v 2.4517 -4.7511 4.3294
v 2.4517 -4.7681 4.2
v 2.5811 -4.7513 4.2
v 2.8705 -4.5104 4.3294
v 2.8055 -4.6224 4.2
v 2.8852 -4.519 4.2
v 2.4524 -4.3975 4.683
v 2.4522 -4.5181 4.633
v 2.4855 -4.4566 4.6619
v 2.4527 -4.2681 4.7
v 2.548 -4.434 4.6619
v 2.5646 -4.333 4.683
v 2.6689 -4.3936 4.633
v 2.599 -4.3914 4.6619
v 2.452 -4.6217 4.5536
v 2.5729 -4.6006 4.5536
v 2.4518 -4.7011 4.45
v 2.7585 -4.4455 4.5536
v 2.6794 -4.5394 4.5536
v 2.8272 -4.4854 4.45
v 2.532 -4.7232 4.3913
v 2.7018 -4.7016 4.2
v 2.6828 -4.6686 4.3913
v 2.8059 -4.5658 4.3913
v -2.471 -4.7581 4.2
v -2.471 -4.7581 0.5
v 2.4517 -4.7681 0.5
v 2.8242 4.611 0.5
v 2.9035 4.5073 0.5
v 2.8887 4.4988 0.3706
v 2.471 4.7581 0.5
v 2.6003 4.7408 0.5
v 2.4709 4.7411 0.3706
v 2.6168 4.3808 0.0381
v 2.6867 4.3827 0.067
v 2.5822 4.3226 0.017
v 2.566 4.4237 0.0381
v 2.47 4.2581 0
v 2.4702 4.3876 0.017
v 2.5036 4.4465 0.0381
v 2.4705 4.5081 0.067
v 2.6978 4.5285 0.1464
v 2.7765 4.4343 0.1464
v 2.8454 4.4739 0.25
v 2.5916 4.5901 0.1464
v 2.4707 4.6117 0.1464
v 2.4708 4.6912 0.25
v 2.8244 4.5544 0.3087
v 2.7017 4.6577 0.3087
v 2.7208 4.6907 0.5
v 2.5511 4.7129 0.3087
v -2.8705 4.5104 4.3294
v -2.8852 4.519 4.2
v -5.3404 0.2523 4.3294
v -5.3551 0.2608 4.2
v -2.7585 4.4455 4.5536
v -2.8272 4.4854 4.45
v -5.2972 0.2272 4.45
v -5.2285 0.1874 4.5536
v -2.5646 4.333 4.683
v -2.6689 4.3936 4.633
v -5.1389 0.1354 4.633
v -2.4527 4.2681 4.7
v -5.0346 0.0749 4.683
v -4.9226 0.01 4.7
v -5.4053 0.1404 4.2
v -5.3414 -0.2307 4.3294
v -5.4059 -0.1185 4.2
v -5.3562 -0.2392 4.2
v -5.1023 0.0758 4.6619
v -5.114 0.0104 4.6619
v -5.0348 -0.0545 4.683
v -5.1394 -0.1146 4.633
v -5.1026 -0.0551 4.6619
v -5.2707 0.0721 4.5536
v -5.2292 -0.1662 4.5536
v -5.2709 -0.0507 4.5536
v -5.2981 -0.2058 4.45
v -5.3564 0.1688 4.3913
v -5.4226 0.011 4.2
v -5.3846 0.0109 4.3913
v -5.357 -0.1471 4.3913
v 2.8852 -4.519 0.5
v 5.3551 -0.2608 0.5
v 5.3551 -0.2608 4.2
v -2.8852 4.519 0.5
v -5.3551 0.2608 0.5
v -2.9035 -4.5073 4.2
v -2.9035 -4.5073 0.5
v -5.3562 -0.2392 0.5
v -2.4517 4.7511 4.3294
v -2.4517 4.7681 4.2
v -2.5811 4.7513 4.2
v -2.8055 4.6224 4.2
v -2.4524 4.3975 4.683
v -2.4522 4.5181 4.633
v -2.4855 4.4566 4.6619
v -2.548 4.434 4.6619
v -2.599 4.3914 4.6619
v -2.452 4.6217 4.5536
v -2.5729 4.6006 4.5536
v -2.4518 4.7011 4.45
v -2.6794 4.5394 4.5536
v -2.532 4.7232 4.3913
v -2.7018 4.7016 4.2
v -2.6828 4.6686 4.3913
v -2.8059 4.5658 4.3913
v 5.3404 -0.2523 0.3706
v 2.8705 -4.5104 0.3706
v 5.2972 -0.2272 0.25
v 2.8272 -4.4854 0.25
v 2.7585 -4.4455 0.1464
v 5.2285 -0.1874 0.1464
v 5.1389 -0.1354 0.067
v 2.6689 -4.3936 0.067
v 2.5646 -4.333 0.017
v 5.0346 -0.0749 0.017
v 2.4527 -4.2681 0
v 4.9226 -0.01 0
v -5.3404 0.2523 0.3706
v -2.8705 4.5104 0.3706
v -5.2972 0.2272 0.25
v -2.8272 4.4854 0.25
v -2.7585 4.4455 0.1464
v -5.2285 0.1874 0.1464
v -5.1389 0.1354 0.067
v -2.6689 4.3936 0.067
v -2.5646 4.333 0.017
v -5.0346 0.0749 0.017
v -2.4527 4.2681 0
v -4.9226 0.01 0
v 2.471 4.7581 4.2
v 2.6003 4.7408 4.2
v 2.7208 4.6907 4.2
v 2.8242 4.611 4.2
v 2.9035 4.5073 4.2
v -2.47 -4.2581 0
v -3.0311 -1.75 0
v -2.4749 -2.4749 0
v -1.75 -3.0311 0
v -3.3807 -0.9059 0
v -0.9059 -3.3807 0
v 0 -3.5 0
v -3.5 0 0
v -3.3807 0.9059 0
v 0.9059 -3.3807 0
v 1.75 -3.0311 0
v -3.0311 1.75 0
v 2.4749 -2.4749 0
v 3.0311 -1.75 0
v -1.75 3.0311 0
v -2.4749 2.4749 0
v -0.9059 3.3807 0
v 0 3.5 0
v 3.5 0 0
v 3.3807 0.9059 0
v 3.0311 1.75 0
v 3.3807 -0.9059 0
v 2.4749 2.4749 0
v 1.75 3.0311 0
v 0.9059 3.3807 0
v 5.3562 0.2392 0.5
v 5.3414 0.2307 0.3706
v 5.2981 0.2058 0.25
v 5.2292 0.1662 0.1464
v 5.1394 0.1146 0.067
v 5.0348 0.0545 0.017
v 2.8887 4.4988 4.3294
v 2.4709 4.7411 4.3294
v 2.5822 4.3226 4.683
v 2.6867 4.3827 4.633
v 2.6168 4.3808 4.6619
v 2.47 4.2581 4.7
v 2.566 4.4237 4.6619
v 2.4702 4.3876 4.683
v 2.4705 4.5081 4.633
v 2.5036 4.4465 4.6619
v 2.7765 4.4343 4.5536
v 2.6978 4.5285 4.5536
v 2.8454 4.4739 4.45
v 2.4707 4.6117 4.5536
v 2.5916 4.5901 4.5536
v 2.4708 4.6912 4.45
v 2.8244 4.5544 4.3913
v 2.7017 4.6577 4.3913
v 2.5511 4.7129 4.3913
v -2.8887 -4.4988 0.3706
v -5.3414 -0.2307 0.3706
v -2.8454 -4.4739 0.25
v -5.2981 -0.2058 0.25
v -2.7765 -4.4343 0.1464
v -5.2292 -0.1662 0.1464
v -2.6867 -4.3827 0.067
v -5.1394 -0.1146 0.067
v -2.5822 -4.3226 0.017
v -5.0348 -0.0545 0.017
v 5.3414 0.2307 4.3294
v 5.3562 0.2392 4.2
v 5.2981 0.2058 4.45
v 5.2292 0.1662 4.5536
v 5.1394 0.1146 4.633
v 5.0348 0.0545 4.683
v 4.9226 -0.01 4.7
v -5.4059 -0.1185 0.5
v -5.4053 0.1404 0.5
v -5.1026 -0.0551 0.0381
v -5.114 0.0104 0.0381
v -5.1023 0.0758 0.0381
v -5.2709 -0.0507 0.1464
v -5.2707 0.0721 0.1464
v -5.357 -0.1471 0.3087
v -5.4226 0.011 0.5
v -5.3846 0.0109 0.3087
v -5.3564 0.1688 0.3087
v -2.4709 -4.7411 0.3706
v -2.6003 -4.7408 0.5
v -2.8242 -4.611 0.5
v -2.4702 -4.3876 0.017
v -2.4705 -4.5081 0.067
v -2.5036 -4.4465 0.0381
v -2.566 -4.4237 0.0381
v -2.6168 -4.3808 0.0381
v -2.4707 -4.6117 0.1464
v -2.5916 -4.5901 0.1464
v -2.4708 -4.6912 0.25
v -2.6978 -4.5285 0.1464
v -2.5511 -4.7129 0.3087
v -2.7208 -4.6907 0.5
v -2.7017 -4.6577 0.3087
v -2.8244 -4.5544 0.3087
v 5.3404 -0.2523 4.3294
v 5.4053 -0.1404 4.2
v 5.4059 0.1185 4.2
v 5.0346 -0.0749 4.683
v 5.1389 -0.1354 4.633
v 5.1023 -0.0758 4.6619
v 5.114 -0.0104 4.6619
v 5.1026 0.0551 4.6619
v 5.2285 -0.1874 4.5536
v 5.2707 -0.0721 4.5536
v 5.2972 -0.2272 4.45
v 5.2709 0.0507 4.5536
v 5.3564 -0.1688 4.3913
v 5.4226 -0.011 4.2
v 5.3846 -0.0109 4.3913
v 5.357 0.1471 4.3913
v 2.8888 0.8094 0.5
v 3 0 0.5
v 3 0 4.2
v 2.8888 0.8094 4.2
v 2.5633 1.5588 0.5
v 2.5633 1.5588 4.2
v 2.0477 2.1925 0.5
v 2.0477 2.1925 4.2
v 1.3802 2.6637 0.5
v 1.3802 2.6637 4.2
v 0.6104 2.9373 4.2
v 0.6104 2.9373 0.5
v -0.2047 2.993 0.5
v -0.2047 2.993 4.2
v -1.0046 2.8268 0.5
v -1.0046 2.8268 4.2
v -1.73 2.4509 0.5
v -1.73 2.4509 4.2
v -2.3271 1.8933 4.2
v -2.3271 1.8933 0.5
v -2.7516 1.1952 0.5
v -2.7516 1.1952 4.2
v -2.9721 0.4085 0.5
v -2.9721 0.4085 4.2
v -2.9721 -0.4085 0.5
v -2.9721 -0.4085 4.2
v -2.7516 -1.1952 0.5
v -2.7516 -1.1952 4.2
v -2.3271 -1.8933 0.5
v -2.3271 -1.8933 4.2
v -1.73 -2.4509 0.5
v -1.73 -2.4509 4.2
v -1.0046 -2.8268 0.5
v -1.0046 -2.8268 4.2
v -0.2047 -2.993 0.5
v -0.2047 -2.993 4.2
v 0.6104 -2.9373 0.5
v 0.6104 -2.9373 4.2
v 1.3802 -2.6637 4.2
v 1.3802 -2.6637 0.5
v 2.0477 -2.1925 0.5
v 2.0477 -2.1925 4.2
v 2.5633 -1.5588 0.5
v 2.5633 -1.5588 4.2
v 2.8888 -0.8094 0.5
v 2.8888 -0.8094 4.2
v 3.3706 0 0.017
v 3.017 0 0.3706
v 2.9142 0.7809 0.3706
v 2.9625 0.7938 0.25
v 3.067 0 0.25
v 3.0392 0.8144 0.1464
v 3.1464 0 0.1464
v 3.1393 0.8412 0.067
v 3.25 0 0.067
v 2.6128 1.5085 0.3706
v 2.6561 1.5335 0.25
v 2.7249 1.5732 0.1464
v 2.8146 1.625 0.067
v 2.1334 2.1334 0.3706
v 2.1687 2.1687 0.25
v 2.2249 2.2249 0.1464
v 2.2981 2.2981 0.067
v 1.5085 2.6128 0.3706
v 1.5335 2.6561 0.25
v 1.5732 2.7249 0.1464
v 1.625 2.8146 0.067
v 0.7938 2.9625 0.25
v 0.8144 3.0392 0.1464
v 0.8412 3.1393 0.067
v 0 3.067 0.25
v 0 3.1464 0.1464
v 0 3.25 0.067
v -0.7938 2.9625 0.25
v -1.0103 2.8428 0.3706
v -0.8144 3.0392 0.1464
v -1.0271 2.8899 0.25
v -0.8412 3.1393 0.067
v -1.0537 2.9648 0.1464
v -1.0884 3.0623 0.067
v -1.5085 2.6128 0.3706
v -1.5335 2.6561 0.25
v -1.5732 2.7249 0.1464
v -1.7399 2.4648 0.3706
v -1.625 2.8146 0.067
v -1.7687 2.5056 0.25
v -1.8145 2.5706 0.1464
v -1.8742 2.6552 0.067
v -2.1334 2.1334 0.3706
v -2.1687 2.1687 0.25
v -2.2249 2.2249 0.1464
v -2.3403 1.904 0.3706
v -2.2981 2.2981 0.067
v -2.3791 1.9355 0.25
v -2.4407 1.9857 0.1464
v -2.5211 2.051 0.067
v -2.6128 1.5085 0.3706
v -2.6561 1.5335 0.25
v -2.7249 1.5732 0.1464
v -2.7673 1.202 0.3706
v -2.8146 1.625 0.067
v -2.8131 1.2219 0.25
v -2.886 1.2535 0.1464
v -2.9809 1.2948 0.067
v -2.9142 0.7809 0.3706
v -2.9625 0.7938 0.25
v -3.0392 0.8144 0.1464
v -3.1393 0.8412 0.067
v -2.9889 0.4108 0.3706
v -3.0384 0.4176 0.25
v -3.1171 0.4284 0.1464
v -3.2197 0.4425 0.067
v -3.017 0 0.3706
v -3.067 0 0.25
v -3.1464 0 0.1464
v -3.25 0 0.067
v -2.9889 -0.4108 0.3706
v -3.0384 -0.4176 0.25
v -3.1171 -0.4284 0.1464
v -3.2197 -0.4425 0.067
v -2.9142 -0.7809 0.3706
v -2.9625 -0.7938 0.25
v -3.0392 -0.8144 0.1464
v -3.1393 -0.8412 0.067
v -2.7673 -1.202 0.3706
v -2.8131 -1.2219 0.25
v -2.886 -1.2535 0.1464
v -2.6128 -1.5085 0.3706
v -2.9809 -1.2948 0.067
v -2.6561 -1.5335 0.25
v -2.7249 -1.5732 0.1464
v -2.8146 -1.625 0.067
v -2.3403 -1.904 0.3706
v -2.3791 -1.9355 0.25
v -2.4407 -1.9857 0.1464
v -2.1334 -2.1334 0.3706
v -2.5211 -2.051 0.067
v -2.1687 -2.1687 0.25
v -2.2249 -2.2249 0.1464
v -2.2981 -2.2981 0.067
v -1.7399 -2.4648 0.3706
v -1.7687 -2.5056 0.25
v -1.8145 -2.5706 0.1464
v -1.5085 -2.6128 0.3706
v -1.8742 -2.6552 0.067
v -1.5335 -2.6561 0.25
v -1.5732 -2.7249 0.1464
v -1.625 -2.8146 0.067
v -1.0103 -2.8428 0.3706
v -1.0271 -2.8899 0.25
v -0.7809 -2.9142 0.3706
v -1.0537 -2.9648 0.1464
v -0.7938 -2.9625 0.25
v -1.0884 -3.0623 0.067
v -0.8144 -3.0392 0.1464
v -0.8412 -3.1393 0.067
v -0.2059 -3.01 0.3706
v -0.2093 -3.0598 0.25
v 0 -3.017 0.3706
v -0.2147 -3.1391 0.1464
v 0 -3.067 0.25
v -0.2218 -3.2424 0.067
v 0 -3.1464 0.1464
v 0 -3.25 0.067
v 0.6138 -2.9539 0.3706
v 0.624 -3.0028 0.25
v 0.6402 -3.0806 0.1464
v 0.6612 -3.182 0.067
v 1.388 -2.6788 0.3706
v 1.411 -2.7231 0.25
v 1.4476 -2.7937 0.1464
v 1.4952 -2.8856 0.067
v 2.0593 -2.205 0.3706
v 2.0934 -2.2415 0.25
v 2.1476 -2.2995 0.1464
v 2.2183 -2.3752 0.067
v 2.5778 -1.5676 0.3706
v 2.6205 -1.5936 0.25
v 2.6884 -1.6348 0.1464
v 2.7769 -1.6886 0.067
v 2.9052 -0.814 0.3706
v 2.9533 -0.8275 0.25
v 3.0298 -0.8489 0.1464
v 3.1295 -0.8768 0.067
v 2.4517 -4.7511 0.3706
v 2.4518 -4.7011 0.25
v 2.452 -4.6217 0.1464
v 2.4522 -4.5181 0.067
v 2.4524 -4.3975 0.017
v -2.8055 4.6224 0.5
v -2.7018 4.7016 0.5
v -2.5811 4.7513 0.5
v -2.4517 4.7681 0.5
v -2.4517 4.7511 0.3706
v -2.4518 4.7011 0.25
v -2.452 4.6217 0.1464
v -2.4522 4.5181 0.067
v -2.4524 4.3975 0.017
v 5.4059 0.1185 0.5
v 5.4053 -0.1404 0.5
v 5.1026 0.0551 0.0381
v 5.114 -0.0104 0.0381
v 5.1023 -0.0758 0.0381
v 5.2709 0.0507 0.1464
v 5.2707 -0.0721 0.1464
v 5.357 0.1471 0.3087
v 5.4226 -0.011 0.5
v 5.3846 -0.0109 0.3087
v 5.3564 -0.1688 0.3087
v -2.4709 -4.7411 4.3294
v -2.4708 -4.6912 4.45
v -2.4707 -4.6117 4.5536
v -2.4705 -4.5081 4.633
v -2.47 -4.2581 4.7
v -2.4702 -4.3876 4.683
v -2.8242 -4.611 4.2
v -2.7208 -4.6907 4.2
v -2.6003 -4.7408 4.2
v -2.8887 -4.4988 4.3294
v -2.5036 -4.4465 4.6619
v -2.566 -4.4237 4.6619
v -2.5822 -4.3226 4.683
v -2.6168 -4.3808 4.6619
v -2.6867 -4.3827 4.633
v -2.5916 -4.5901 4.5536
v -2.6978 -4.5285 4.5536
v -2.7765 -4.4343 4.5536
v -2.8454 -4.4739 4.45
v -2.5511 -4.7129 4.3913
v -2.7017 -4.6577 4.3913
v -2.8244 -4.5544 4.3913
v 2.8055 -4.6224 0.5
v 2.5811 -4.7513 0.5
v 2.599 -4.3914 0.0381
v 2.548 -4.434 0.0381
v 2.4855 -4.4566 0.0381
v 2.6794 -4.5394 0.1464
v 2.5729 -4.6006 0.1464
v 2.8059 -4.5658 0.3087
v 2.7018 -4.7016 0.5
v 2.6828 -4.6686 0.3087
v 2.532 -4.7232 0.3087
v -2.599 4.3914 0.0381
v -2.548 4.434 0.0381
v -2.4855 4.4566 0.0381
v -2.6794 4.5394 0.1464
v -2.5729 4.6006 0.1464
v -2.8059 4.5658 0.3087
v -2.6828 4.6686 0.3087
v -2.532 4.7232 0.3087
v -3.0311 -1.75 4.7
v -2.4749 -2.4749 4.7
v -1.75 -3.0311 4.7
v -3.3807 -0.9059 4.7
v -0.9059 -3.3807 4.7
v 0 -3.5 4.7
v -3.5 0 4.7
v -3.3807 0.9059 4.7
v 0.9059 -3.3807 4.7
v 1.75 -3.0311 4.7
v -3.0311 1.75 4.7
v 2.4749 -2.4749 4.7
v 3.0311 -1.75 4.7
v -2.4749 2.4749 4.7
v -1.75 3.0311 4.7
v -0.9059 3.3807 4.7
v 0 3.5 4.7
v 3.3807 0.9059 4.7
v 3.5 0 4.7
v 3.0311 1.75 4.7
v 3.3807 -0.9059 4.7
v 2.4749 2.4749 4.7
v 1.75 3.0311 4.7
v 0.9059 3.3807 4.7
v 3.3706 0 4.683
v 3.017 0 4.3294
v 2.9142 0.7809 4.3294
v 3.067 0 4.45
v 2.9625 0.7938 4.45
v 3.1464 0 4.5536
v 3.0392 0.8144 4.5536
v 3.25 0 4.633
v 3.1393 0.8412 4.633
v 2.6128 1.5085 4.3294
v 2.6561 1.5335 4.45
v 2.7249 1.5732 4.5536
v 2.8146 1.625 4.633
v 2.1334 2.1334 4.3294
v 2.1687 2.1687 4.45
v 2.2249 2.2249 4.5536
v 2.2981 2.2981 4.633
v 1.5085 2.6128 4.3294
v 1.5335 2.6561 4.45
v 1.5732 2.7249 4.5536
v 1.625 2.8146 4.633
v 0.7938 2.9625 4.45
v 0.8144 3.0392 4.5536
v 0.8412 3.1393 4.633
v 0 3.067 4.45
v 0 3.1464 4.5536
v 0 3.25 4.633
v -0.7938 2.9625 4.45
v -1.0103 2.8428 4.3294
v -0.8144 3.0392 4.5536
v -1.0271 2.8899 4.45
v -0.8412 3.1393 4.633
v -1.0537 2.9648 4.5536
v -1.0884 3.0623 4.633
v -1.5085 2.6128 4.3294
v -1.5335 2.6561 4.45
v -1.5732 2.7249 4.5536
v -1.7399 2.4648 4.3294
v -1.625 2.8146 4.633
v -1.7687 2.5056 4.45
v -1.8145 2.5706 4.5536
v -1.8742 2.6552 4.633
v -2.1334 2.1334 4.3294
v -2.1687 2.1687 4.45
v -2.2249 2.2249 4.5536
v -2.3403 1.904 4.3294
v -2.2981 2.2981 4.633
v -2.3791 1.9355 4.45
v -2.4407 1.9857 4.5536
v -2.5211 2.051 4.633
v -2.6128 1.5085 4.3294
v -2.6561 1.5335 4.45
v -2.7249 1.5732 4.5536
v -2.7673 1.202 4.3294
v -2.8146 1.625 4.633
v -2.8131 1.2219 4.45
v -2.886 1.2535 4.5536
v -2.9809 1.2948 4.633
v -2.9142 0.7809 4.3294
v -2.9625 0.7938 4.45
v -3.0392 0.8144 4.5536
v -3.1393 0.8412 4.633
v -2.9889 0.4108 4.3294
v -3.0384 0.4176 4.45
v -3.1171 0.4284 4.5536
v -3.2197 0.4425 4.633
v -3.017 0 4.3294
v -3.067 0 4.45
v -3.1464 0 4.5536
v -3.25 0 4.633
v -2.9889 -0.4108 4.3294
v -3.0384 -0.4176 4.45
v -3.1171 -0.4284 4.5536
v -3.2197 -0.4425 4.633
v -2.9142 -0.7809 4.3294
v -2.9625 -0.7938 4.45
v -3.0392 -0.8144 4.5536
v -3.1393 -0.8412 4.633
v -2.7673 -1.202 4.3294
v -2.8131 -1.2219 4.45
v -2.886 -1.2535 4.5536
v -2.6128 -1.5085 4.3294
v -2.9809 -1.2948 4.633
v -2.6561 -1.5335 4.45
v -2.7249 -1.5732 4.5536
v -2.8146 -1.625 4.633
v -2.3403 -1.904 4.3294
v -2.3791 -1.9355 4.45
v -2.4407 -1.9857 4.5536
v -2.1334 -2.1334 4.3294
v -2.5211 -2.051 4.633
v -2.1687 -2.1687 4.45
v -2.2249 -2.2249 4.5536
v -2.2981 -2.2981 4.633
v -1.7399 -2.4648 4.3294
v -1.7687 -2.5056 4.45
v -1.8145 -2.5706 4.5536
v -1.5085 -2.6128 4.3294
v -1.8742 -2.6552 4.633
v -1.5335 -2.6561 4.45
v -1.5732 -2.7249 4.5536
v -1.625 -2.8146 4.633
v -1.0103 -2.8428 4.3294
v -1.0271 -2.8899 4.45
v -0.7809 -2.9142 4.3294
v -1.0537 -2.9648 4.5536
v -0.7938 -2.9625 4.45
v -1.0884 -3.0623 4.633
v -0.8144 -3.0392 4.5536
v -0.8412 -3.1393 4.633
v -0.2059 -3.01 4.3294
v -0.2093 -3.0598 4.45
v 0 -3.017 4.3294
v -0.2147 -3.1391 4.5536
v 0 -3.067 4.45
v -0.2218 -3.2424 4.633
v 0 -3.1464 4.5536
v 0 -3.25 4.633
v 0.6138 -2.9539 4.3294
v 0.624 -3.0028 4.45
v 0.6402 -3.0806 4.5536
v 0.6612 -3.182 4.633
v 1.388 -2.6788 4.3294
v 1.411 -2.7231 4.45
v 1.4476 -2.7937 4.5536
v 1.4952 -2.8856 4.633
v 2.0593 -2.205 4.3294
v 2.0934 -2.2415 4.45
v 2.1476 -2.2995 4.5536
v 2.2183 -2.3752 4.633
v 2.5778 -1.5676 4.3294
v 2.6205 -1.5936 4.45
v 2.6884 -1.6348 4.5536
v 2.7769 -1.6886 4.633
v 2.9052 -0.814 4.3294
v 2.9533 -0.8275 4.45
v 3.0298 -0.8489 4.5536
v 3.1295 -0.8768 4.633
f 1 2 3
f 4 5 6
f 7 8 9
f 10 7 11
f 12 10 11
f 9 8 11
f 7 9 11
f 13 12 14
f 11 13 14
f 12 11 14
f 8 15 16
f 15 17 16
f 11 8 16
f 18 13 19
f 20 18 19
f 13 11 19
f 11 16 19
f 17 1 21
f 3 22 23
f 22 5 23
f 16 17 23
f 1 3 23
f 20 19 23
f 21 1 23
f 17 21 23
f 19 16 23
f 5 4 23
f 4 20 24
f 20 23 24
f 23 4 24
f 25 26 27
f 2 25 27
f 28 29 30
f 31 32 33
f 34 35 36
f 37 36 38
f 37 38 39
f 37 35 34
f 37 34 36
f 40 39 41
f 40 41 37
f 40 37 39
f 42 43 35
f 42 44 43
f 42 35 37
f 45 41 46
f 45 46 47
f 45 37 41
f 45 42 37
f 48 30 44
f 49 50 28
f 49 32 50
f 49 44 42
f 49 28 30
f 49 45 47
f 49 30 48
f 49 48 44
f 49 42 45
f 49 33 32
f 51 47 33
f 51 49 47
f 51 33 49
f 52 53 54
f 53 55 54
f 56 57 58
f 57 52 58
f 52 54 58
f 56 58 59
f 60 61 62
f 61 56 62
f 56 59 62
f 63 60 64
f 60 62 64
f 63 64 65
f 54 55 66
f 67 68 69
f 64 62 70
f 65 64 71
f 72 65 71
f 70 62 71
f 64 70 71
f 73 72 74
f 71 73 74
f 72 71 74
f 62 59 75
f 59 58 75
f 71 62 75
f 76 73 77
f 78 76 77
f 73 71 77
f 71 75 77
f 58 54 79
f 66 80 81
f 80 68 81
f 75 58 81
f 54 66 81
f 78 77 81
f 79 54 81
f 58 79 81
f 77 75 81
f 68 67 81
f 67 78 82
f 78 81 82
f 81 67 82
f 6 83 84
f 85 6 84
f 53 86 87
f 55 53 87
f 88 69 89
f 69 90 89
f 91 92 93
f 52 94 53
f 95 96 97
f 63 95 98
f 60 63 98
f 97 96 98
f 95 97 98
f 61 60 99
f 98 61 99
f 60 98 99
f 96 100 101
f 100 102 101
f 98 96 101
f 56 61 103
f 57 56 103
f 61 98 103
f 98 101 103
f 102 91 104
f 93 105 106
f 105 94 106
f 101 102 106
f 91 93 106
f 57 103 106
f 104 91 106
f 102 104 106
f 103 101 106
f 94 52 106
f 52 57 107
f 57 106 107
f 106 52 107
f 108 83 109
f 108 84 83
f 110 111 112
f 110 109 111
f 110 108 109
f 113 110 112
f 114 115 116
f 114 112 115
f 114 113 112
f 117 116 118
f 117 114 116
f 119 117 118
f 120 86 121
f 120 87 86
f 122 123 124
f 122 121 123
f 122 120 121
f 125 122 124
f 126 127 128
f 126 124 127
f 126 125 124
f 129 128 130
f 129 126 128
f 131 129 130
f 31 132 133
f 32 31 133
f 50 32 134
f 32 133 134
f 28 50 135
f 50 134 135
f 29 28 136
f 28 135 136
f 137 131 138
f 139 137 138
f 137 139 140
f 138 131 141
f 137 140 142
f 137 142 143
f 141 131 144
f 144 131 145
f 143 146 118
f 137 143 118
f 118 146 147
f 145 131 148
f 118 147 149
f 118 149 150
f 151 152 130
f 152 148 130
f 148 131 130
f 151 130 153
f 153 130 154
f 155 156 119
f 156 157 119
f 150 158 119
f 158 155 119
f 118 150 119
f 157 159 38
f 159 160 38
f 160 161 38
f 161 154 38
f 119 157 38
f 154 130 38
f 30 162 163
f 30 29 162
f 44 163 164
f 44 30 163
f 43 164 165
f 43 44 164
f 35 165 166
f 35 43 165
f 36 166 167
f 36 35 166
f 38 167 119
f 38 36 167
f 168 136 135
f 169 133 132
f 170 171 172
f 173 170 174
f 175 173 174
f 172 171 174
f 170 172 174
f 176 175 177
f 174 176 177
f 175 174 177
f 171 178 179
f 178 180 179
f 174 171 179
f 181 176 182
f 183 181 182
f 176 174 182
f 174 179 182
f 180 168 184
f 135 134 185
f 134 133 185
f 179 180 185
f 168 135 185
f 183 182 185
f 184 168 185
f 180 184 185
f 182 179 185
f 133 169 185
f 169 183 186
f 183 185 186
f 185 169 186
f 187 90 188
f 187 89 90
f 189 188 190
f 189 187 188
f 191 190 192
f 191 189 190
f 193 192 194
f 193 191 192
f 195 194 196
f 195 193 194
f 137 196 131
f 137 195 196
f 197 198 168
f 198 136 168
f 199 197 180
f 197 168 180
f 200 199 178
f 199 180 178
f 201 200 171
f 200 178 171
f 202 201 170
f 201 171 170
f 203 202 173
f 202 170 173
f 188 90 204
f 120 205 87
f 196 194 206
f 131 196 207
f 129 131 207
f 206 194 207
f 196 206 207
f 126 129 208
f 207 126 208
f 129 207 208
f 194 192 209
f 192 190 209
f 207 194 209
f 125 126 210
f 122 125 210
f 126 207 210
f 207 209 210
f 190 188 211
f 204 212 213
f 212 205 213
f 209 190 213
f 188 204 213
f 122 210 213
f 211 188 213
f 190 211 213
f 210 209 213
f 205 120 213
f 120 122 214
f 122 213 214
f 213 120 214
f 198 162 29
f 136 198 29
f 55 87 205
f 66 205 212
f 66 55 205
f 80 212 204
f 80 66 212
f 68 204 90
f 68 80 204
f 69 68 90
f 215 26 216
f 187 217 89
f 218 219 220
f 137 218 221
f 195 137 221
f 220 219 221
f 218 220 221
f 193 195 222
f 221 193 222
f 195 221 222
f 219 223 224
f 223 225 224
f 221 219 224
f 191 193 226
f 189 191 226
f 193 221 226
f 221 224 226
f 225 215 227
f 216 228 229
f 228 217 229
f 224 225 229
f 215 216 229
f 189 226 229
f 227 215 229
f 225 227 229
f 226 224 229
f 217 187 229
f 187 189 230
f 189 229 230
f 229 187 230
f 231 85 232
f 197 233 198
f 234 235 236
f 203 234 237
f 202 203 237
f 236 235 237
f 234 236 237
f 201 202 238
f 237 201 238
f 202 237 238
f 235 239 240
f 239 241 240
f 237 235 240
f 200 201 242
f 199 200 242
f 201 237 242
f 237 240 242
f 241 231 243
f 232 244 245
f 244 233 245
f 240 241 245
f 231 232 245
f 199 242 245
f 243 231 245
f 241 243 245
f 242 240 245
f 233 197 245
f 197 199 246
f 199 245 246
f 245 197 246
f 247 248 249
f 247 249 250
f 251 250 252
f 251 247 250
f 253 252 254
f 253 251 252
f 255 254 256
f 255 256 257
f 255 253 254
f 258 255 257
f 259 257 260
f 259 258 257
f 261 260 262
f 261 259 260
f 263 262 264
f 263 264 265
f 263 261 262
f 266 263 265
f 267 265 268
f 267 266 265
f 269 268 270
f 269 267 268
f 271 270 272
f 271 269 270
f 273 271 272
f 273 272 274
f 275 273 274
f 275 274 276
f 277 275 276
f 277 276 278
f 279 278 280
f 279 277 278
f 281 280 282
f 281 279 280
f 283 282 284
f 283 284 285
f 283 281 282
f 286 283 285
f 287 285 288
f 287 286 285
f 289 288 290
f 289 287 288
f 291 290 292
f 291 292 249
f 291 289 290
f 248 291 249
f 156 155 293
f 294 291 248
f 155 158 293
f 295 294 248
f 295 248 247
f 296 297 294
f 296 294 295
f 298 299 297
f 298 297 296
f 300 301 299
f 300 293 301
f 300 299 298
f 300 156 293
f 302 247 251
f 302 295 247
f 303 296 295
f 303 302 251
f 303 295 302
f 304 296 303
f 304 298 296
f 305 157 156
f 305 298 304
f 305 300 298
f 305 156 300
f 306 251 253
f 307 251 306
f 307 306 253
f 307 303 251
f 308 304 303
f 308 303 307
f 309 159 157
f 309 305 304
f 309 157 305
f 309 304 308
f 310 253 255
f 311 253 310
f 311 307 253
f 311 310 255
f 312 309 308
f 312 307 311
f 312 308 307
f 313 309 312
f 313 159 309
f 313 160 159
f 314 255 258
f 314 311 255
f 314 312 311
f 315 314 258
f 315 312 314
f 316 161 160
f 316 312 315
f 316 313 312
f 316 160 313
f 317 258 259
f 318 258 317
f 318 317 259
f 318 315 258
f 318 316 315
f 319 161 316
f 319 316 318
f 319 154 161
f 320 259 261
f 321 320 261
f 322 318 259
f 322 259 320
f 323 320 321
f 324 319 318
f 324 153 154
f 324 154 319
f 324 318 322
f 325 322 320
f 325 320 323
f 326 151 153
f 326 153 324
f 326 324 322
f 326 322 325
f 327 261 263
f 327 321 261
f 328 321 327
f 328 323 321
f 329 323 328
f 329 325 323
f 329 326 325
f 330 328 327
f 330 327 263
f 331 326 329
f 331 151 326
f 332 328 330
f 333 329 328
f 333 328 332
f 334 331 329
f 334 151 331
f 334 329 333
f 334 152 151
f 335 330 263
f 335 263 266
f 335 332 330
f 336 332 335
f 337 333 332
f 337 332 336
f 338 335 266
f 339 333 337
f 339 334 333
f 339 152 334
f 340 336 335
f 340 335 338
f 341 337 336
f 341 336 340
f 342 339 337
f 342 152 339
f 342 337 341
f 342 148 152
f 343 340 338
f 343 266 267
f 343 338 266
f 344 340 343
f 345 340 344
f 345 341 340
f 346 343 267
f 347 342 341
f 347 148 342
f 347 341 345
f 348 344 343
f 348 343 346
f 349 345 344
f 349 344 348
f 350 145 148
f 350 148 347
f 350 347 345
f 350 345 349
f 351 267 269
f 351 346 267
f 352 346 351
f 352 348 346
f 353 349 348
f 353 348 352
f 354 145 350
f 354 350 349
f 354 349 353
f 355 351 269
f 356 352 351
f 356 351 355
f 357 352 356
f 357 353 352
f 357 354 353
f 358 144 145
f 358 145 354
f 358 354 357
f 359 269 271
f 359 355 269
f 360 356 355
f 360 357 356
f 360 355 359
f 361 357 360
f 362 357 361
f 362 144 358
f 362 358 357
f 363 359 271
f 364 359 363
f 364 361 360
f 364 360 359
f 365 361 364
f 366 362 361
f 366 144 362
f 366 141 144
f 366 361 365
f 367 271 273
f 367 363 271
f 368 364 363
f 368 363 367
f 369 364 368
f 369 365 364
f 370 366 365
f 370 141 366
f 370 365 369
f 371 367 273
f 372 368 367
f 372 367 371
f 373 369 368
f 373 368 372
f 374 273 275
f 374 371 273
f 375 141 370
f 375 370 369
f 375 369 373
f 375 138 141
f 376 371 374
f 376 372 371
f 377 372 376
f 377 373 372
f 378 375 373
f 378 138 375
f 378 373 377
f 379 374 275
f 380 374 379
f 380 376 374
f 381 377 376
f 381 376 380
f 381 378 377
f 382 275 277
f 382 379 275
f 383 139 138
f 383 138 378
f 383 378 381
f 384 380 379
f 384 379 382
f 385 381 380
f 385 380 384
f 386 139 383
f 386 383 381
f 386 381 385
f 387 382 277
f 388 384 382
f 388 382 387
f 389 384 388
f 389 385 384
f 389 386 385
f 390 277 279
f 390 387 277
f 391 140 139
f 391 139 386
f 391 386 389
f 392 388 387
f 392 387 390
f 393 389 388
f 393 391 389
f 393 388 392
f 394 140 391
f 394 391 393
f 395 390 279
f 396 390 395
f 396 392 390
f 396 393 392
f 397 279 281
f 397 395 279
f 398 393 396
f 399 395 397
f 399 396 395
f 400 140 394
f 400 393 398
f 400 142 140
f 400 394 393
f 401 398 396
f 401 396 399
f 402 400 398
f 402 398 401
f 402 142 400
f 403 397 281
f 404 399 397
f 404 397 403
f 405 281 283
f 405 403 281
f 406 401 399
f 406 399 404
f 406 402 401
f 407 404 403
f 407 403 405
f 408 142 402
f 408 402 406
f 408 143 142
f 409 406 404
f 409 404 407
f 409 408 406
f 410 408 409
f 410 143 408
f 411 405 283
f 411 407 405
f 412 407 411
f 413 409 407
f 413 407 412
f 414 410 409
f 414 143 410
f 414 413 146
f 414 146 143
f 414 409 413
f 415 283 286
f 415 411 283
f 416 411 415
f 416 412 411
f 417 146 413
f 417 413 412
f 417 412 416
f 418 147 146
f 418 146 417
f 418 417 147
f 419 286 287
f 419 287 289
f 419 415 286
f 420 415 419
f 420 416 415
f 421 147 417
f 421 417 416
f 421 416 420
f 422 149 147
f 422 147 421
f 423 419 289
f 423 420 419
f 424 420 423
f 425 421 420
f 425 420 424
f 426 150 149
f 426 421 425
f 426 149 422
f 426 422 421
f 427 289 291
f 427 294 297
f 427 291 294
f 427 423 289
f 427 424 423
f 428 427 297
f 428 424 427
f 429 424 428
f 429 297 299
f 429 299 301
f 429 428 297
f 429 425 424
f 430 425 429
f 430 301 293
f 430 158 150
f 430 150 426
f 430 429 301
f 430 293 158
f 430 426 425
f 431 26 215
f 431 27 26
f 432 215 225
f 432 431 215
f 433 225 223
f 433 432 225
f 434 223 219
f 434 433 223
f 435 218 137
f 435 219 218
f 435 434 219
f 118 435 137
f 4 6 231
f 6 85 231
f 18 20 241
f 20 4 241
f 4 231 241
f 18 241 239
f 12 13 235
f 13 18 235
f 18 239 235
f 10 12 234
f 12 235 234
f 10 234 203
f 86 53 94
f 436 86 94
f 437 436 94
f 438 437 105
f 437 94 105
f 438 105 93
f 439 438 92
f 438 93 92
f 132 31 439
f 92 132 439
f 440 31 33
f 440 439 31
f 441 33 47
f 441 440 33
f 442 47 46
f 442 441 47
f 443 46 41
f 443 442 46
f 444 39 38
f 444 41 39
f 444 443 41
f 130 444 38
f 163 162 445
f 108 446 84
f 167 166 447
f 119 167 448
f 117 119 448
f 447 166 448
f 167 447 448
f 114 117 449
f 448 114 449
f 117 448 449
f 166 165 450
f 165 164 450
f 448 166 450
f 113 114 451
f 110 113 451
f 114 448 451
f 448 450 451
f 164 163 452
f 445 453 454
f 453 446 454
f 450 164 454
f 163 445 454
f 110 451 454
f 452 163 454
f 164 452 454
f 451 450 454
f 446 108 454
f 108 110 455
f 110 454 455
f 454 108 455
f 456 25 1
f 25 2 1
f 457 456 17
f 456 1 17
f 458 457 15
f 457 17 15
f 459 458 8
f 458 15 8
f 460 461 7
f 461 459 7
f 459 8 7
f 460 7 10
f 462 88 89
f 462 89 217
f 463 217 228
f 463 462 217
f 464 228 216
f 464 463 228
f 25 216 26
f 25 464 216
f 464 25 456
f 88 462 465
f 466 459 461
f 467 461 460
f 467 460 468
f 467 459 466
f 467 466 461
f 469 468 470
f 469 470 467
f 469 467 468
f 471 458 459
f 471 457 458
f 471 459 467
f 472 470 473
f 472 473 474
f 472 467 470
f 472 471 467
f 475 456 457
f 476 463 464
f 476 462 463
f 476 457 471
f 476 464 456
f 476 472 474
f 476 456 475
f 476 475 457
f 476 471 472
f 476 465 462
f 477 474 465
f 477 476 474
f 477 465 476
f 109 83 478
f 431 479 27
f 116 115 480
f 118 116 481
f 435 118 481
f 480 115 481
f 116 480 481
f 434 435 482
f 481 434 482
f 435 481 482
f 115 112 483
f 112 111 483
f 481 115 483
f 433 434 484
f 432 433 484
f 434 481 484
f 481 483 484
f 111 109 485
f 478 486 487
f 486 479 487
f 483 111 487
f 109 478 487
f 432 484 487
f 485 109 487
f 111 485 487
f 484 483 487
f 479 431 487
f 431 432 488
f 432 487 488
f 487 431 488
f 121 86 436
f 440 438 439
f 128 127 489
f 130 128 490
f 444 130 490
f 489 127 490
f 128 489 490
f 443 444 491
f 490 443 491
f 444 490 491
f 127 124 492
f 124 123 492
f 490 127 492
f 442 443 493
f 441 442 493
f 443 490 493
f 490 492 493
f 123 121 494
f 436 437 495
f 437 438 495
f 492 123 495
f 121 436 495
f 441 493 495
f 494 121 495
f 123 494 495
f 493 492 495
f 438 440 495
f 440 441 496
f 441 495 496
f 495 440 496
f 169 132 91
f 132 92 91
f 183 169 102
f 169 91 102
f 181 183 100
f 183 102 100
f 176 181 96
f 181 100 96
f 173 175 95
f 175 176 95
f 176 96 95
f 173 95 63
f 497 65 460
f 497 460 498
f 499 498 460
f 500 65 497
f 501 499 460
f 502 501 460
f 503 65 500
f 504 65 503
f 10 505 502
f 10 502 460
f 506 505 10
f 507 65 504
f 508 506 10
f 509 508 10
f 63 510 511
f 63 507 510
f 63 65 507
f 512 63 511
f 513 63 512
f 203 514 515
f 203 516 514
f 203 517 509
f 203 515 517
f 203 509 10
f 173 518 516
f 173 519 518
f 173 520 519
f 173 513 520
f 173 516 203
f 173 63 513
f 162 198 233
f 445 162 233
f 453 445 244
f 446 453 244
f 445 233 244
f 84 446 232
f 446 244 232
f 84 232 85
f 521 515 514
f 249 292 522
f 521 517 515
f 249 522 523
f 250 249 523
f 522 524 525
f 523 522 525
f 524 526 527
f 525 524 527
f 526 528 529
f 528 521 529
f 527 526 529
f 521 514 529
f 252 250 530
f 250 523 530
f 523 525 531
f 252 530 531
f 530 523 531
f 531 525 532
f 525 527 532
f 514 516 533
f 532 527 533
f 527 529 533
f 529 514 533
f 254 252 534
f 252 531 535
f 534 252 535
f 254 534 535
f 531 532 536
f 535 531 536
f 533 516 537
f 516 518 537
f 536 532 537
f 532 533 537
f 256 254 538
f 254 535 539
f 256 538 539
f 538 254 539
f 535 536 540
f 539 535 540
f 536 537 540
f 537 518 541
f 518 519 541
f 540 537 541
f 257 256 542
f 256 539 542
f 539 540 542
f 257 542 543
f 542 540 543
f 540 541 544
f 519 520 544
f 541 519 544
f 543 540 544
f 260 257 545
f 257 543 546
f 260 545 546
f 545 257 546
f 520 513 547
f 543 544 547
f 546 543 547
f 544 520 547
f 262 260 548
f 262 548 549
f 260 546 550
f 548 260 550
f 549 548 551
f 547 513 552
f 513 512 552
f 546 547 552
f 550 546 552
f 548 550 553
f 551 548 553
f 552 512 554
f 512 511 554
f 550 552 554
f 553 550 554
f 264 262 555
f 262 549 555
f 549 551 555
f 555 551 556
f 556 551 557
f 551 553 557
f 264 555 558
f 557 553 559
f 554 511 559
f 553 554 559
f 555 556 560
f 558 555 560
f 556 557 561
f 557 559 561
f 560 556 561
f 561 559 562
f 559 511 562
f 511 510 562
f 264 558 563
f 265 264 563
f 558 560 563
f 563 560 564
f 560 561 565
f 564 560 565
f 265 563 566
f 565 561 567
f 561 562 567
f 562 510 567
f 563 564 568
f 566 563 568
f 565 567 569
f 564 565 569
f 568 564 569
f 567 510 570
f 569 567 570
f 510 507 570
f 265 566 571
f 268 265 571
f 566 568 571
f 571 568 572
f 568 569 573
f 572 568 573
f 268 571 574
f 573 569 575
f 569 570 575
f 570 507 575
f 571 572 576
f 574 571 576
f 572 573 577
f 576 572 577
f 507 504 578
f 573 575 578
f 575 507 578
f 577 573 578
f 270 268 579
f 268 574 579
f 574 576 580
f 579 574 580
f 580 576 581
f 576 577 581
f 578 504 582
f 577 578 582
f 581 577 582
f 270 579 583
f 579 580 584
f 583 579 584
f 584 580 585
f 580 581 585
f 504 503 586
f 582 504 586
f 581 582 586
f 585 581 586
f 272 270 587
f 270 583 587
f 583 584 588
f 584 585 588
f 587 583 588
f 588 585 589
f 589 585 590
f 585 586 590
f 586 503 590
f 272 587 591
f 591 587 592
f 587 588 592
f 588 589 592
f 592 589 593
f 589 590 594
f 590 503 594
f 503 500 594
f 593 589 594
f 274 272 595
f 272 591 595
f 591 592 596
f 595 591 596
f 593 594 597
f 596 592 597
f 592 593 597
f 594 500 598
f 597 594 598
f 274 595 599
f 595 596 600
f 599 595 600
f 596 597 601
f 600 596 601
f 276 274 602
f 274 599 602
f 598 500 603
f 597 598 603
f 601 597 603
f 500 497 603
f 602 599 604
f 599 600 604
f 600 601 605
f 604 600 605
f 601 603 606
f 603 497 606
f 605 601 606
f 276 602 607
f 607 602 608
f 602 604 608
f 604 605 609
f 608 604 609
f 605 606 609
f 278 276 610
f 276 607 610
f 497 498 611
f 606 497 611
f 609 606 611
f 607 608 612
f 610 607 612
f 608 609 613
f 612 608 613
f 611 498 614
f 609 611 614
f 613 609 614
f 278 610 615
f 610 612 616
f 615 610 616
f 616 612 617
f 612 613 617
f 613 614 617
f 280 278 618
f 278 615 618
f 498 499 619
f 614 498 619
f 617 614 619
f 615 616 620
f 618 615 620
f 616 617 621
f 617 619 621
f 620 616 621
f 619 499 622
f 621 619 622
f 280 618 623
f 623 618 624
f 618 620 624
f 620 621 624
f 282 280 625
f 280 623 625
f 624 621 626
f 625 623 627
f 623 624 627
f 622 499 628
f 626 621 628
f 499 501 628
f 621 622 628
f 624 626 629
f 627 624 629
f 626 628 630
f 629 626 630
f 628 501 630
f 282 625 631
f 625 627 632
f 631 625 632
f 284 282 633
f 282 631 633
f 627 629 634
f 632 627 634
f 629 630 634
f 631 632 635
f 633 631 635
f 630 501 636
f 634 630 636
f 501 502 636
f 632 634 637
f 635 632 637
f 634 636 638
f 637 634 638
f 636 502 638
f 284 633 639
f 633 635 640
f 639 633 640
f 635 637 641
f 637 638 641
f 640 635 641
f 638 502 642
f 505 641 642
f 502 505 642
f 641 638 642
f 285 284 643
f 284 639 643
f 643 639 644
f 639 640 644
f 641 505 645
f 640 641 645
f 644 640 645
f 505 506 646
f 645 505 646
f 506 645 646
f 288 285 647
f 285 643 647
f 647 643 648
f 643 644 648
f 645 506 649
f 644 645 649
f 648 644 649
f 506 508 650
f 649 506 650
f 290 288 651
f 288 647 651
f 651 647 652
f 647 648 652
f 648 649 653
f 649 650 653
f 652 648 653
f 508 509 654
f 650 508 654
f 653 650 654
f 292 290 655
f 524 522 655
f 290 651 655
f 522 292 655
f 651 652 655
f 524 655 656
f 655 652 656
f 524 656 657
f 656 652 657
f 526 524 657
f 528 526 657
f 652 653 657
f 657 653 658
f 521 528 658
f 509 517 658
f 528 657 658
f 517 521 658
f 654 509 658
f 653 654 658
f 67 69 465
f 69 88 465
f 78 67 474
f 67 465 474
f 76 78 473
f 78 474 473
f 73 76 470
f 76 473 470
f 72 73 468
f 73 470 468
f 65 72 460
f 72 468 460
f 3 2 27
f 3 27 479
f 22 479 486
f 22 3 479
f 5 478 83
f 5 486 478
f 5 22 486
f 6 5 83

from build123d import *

# Parameters (mm, degrees)
SKETCH1_R           = 3
BOSS_EXTRUDE1_DEPTH = 4.7
FILLET1_R           = 0.5


with BuildPart() as part:
    # Sketch1 → Boss-Extrude1 (new body)
    with BuildSketch(Plane.XY):
        Polygon((-2.740345561, 4.768700683), (-5.499988715, 0.011141471), (-2.759643154, -4.757559213), (2.740345561, -4.768700683), (5.499988715, -0.011141471), (2.759643154, 4.757559213), align=None)
        Circle(SKETCH1_R, mode=Mode.SUBTRACT)
    extrude(amount=BOSS_EXTRUDE1_DEPTH)

    # Fillet1
    fillet1_edges = [part.edges().sort_by_distance(p)[0] for p in [
        (-4.129815935, -2.373208871, 4.7),
        (2.759643154, 4.757559213, 2.35),
        (5.499988715, -0.011141471, 2.35),
        (2.740345561, -4.768700683, 2.35),
        (-2.759643154, -4.757559213, 2.35),
        (-5.499988715, 0.011141471, 2.35),
        (-2.740345561, 4.768700683, 2.35),
        (-0.009648797, -4.763129948, 4.7),
        (4.120167138, -2.389921077, 4.7),
        (-3, 0, 0),
        (-3, 0, 4.7),
        (4.129815935, 2.373208871, 4.7),
        (0.009648797, 4.763129948, 4.7),
        (4.129815935, 2.373208871, 0),
        (4.120167138, -2.389921077, 0),
        (-0.009648797, -4.763129948, 0),
        (-4.120167138, 2.389921077, 4.7),
        (-4.129815935, -2.373208871, 0),
        (-4.120167138, 2.389921077, 0),
        (0.009648797, 4.763129948, 0),
    ]]
    fillet(fillet1_edges, radius=FILLET1_R)


solid = part.part
